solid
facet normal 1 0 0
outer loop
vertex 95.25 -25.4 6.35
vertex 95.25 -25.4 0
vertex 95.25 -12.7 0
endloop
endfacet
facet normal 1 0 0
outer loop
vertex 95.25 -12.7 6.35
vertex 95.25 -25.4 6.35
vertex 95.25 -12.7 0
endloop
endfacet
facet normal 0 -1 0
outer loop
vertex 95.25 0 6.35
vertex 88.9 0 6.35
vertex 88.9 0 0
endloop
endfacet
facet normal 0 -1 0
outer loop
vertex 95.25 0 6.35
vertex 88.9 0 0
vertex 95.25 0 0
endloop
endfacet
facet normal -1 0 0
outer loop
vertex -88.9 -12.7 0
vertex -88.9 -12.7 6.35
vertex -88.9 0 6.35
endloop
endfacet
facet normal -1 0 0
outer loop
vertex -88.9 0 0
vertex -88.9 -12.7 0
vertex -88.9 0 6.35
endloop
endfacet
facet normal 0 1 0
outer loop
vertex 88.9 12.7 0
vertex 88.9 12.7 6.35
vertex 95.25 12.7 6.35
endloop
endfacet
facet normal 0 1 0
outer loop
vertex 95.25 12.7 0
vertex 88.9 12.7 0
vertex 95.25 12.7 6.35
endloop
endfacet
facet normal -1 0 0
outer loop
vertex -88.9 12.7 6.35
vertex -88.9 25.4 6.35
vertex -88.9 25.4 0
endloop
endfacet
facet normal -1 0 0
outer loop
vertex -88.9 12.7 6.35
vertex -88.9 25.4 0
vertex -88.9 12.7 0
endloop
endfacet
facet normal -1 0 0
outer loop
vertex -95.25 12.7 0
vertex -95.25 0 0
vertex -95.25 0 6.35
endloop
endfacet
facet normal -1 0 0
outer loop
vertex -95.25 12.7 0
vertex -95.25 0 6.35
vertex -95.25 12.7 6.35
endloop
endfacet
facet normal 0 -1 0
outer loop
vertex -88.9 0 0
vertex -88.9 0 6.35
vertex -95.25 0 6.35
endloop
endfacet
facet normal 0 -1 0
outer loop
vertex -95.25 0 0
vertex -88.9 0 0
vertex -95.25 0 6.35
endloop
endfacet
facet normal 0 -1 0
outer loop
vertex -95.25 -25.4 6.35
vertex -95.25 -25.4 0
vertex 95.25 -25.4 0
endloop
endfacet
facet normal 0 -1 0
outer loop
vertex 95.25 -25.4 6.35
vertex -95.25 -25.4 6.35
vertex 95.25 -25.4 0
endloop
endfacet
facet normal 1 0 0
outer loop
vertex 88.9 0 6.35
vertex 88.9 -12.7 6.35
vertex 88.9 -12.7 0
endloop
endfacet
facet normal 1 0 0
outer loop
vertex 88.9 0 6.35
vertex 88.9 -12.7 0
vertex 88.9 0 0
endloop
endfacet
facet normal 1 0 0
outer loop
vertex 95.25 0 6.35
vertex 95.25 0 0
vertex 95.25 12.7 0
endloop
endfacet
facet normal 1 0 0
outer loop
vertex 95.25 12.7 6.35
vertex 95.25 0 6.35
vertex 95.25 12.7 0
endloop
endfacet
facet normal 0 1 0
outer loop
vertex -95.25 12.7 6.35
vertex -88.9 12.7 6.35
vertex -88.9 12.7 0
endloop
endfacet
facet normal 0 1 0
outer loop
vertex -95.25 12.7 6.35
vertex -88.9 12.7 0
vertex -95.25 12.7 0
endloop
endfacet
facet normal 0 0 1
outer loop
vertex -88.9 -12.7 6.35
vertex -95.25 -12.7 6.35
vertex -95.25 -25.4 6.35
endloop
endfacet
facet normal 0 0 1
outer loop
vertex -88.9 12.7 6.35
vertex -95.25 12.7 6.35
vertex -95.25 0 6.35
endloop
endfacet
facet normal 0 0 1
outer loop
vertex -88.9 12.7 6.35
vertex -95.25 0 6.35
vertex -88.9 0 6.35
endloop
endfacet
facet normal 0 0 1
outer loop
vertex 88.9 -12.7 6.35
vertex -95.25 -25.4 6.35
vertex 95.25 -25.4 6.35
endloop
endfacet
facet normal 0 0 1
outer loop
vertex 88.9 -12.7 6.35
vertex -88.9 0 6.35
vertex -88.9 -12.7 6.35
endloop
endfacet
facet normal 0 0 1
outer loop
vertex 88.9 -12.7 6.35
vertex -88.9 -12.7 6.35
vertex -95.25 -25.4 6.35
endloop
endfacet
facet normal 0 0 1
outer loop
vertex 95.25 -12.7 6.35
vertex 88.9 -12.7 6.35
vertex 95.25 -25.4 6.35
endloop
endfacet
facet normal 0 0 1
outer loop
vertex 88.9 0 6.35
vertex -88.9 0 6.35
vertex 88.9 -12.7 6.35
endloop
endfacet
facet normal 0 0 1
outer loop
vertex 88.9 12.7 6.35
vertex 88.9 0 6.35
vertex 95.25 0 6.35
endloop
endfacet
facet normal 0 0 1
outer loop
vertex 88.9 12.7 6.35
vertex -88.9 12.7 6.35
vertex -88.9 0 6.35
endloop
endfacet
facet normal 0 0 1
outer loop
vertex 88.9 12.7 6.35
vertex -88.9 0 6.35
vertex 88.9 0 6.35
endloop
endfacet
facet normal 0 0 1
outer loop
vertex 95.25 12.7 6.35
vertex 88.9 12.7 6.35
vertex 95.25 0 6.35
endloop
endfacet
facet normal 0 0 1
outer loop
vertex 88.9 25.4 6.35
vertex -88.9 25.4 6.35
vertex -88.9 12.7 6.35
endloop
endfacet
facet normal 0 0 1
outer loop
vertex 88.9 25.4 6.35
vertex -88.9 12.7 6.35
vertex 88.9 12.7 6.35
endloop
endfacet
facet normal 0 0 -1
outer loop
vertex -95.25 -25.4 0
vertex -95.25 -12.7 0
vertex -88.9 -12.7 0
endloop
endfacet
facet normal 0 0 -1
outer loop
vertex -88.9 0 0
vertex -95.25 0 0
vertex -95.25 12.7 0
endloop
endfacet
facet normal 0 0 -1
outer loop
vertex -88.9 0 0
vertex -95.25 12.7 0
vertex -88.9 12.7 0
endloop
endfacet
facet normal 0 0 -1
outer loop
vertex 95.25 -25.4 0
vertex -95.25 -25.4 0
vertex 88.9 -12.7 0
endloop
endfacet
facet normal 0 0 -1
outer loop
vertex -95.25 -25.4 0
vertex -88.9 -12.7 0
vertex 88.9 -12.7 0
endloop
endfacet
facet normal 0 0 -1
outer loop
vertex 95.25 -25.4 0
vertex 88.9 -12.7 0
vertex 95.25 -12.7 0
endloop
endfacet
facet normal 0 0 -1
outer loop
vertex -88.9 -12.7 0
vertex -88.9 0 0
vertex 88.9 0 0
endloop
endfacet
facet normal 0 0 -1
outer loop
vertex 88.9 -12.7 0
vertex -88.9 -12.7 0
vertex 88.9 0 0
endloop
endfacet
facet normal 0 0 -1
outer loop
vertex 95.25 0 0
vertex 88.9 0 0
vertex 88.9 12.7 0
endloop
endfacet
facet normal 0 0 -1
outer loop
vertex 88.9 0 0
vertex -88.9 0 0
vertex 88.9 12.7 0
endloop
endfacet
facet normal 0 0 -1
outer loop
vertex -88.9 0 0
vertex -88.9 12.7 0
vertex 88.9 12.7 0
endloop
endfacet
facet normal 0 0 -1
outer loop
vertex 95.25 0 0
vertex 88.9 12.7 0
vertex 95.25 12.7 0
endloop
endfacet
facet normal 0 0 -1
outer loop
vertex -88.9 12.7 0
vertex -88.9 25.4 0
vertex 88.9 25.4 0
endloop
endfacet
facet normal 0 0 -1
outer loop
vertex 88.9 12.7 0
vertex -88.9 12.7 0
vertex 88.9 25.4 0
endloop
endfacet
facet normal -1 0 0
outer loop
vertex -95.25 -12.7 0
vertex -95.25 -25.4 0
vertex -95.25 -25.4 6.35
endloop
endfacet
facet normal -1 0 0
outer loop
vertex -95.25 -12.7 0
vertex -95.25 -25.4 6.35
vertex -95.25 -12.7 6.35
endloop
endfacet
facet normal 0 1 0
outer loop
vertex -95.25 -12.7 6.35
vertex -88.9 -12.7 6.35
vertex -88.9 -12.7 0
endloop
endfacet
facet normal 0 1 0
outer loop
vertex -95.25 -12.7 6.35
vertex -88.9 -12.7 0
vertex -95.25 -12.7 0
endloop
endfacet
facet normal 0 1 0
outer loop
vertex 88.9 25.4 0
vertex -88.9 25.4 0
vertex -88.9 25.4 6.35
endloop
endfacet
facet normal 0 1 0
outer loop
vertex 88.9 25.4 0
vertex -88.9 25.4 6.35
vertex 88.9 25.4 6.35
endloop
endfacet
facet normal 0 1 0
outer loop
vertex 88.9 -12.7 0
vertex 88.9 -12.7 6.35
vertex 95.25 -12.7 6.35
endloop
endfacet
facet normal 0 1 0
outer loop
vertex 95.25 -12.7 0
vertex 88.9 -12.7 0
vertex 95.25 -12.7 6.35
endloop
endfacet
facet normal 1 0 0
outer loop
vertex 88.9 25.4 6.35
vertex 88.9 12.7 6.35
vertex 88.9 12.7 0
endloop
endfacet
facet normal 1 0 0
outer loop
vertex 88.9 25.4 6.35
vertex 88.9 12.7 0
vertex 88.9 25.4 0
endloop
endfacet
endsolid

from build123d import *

# Parameters (mm, degrees)
SKETCH1_W               = 190.5
SKETCH1_H               = 50.8
BOSS_EXTRUDE1_DEPTH     = 6.35
SKETCH2_W               = 6.35
SKETCH2_H               = 12.7
CUT_EXTRUDE1_DEPTH      = 7.35
LPATTERN1_COUNT         = 2
LPATTERN1_PITCH         = 25.4
MIRROR1_COPY_1_SKETCH_W = 6.35
MIRROR1_COPY_1_SKETCH_H = 12.7
MIRROR1_COPY_1_DEPTH    = 7.35


with BuildPart() as part:
    # Sketch1 → Boss-Extrude1 (new body)
    with BuildSketch(Plane.XY):
        Rectangle(SKETCH1_W, SKETCH1_H)
    extrude(amount=BOSS_EXTRUDE1_DEPTH)

    # Sketch2 → Cut-Extrude1 (cut, through all)
    with BuildSketch(Plane.XY.offset(6.35)):
        with Locations((92.075, -6.35)):
            Rectangle(SKETCH2_W, SKETCH2_H)
    cut_extrude1 = extrude(amount=-CUT_EXTRUDE1_DEPTH, mode=Mode.SUBTRACT)

    # LPattern1: Cut-Extrude1 ×2
    with Locations(*[(0, i * LPATTERN1_PITCH, 0) for i in range(1, LPATTERN1_COUNT)]):
        add(cut_extrude1, mode=Mode.SUBTRACT)

    # Mirror1: Cut-Extrude1 across plane
    add(cut_extrude1.mirror(Plane(origin=(0, 0, 0), x_dir=(0, 0, 1), z_dir=(1, 0, 0))), mode=Mode.SUBTRACT)

    # Mirror1 copy 1 sketch → Mirror1 copy 1 (cut, through all)
    with BuildSketch(Plane(origin=(0, 25.4, 6.35), x_dir=(-1, 0, 0), z_dir=(0, 0, 1))):
        with Locations((92.075, 6.35)):
            Rectangle(MIRROR1_COPY_1_SKETCH_W, MIRROR1_COPY_1_SKETCH_H)
    extrude(amount=-MIRROR1_COPY_1_DEPTH, mode=Mode.SUBTRACT)


solid = part.part
